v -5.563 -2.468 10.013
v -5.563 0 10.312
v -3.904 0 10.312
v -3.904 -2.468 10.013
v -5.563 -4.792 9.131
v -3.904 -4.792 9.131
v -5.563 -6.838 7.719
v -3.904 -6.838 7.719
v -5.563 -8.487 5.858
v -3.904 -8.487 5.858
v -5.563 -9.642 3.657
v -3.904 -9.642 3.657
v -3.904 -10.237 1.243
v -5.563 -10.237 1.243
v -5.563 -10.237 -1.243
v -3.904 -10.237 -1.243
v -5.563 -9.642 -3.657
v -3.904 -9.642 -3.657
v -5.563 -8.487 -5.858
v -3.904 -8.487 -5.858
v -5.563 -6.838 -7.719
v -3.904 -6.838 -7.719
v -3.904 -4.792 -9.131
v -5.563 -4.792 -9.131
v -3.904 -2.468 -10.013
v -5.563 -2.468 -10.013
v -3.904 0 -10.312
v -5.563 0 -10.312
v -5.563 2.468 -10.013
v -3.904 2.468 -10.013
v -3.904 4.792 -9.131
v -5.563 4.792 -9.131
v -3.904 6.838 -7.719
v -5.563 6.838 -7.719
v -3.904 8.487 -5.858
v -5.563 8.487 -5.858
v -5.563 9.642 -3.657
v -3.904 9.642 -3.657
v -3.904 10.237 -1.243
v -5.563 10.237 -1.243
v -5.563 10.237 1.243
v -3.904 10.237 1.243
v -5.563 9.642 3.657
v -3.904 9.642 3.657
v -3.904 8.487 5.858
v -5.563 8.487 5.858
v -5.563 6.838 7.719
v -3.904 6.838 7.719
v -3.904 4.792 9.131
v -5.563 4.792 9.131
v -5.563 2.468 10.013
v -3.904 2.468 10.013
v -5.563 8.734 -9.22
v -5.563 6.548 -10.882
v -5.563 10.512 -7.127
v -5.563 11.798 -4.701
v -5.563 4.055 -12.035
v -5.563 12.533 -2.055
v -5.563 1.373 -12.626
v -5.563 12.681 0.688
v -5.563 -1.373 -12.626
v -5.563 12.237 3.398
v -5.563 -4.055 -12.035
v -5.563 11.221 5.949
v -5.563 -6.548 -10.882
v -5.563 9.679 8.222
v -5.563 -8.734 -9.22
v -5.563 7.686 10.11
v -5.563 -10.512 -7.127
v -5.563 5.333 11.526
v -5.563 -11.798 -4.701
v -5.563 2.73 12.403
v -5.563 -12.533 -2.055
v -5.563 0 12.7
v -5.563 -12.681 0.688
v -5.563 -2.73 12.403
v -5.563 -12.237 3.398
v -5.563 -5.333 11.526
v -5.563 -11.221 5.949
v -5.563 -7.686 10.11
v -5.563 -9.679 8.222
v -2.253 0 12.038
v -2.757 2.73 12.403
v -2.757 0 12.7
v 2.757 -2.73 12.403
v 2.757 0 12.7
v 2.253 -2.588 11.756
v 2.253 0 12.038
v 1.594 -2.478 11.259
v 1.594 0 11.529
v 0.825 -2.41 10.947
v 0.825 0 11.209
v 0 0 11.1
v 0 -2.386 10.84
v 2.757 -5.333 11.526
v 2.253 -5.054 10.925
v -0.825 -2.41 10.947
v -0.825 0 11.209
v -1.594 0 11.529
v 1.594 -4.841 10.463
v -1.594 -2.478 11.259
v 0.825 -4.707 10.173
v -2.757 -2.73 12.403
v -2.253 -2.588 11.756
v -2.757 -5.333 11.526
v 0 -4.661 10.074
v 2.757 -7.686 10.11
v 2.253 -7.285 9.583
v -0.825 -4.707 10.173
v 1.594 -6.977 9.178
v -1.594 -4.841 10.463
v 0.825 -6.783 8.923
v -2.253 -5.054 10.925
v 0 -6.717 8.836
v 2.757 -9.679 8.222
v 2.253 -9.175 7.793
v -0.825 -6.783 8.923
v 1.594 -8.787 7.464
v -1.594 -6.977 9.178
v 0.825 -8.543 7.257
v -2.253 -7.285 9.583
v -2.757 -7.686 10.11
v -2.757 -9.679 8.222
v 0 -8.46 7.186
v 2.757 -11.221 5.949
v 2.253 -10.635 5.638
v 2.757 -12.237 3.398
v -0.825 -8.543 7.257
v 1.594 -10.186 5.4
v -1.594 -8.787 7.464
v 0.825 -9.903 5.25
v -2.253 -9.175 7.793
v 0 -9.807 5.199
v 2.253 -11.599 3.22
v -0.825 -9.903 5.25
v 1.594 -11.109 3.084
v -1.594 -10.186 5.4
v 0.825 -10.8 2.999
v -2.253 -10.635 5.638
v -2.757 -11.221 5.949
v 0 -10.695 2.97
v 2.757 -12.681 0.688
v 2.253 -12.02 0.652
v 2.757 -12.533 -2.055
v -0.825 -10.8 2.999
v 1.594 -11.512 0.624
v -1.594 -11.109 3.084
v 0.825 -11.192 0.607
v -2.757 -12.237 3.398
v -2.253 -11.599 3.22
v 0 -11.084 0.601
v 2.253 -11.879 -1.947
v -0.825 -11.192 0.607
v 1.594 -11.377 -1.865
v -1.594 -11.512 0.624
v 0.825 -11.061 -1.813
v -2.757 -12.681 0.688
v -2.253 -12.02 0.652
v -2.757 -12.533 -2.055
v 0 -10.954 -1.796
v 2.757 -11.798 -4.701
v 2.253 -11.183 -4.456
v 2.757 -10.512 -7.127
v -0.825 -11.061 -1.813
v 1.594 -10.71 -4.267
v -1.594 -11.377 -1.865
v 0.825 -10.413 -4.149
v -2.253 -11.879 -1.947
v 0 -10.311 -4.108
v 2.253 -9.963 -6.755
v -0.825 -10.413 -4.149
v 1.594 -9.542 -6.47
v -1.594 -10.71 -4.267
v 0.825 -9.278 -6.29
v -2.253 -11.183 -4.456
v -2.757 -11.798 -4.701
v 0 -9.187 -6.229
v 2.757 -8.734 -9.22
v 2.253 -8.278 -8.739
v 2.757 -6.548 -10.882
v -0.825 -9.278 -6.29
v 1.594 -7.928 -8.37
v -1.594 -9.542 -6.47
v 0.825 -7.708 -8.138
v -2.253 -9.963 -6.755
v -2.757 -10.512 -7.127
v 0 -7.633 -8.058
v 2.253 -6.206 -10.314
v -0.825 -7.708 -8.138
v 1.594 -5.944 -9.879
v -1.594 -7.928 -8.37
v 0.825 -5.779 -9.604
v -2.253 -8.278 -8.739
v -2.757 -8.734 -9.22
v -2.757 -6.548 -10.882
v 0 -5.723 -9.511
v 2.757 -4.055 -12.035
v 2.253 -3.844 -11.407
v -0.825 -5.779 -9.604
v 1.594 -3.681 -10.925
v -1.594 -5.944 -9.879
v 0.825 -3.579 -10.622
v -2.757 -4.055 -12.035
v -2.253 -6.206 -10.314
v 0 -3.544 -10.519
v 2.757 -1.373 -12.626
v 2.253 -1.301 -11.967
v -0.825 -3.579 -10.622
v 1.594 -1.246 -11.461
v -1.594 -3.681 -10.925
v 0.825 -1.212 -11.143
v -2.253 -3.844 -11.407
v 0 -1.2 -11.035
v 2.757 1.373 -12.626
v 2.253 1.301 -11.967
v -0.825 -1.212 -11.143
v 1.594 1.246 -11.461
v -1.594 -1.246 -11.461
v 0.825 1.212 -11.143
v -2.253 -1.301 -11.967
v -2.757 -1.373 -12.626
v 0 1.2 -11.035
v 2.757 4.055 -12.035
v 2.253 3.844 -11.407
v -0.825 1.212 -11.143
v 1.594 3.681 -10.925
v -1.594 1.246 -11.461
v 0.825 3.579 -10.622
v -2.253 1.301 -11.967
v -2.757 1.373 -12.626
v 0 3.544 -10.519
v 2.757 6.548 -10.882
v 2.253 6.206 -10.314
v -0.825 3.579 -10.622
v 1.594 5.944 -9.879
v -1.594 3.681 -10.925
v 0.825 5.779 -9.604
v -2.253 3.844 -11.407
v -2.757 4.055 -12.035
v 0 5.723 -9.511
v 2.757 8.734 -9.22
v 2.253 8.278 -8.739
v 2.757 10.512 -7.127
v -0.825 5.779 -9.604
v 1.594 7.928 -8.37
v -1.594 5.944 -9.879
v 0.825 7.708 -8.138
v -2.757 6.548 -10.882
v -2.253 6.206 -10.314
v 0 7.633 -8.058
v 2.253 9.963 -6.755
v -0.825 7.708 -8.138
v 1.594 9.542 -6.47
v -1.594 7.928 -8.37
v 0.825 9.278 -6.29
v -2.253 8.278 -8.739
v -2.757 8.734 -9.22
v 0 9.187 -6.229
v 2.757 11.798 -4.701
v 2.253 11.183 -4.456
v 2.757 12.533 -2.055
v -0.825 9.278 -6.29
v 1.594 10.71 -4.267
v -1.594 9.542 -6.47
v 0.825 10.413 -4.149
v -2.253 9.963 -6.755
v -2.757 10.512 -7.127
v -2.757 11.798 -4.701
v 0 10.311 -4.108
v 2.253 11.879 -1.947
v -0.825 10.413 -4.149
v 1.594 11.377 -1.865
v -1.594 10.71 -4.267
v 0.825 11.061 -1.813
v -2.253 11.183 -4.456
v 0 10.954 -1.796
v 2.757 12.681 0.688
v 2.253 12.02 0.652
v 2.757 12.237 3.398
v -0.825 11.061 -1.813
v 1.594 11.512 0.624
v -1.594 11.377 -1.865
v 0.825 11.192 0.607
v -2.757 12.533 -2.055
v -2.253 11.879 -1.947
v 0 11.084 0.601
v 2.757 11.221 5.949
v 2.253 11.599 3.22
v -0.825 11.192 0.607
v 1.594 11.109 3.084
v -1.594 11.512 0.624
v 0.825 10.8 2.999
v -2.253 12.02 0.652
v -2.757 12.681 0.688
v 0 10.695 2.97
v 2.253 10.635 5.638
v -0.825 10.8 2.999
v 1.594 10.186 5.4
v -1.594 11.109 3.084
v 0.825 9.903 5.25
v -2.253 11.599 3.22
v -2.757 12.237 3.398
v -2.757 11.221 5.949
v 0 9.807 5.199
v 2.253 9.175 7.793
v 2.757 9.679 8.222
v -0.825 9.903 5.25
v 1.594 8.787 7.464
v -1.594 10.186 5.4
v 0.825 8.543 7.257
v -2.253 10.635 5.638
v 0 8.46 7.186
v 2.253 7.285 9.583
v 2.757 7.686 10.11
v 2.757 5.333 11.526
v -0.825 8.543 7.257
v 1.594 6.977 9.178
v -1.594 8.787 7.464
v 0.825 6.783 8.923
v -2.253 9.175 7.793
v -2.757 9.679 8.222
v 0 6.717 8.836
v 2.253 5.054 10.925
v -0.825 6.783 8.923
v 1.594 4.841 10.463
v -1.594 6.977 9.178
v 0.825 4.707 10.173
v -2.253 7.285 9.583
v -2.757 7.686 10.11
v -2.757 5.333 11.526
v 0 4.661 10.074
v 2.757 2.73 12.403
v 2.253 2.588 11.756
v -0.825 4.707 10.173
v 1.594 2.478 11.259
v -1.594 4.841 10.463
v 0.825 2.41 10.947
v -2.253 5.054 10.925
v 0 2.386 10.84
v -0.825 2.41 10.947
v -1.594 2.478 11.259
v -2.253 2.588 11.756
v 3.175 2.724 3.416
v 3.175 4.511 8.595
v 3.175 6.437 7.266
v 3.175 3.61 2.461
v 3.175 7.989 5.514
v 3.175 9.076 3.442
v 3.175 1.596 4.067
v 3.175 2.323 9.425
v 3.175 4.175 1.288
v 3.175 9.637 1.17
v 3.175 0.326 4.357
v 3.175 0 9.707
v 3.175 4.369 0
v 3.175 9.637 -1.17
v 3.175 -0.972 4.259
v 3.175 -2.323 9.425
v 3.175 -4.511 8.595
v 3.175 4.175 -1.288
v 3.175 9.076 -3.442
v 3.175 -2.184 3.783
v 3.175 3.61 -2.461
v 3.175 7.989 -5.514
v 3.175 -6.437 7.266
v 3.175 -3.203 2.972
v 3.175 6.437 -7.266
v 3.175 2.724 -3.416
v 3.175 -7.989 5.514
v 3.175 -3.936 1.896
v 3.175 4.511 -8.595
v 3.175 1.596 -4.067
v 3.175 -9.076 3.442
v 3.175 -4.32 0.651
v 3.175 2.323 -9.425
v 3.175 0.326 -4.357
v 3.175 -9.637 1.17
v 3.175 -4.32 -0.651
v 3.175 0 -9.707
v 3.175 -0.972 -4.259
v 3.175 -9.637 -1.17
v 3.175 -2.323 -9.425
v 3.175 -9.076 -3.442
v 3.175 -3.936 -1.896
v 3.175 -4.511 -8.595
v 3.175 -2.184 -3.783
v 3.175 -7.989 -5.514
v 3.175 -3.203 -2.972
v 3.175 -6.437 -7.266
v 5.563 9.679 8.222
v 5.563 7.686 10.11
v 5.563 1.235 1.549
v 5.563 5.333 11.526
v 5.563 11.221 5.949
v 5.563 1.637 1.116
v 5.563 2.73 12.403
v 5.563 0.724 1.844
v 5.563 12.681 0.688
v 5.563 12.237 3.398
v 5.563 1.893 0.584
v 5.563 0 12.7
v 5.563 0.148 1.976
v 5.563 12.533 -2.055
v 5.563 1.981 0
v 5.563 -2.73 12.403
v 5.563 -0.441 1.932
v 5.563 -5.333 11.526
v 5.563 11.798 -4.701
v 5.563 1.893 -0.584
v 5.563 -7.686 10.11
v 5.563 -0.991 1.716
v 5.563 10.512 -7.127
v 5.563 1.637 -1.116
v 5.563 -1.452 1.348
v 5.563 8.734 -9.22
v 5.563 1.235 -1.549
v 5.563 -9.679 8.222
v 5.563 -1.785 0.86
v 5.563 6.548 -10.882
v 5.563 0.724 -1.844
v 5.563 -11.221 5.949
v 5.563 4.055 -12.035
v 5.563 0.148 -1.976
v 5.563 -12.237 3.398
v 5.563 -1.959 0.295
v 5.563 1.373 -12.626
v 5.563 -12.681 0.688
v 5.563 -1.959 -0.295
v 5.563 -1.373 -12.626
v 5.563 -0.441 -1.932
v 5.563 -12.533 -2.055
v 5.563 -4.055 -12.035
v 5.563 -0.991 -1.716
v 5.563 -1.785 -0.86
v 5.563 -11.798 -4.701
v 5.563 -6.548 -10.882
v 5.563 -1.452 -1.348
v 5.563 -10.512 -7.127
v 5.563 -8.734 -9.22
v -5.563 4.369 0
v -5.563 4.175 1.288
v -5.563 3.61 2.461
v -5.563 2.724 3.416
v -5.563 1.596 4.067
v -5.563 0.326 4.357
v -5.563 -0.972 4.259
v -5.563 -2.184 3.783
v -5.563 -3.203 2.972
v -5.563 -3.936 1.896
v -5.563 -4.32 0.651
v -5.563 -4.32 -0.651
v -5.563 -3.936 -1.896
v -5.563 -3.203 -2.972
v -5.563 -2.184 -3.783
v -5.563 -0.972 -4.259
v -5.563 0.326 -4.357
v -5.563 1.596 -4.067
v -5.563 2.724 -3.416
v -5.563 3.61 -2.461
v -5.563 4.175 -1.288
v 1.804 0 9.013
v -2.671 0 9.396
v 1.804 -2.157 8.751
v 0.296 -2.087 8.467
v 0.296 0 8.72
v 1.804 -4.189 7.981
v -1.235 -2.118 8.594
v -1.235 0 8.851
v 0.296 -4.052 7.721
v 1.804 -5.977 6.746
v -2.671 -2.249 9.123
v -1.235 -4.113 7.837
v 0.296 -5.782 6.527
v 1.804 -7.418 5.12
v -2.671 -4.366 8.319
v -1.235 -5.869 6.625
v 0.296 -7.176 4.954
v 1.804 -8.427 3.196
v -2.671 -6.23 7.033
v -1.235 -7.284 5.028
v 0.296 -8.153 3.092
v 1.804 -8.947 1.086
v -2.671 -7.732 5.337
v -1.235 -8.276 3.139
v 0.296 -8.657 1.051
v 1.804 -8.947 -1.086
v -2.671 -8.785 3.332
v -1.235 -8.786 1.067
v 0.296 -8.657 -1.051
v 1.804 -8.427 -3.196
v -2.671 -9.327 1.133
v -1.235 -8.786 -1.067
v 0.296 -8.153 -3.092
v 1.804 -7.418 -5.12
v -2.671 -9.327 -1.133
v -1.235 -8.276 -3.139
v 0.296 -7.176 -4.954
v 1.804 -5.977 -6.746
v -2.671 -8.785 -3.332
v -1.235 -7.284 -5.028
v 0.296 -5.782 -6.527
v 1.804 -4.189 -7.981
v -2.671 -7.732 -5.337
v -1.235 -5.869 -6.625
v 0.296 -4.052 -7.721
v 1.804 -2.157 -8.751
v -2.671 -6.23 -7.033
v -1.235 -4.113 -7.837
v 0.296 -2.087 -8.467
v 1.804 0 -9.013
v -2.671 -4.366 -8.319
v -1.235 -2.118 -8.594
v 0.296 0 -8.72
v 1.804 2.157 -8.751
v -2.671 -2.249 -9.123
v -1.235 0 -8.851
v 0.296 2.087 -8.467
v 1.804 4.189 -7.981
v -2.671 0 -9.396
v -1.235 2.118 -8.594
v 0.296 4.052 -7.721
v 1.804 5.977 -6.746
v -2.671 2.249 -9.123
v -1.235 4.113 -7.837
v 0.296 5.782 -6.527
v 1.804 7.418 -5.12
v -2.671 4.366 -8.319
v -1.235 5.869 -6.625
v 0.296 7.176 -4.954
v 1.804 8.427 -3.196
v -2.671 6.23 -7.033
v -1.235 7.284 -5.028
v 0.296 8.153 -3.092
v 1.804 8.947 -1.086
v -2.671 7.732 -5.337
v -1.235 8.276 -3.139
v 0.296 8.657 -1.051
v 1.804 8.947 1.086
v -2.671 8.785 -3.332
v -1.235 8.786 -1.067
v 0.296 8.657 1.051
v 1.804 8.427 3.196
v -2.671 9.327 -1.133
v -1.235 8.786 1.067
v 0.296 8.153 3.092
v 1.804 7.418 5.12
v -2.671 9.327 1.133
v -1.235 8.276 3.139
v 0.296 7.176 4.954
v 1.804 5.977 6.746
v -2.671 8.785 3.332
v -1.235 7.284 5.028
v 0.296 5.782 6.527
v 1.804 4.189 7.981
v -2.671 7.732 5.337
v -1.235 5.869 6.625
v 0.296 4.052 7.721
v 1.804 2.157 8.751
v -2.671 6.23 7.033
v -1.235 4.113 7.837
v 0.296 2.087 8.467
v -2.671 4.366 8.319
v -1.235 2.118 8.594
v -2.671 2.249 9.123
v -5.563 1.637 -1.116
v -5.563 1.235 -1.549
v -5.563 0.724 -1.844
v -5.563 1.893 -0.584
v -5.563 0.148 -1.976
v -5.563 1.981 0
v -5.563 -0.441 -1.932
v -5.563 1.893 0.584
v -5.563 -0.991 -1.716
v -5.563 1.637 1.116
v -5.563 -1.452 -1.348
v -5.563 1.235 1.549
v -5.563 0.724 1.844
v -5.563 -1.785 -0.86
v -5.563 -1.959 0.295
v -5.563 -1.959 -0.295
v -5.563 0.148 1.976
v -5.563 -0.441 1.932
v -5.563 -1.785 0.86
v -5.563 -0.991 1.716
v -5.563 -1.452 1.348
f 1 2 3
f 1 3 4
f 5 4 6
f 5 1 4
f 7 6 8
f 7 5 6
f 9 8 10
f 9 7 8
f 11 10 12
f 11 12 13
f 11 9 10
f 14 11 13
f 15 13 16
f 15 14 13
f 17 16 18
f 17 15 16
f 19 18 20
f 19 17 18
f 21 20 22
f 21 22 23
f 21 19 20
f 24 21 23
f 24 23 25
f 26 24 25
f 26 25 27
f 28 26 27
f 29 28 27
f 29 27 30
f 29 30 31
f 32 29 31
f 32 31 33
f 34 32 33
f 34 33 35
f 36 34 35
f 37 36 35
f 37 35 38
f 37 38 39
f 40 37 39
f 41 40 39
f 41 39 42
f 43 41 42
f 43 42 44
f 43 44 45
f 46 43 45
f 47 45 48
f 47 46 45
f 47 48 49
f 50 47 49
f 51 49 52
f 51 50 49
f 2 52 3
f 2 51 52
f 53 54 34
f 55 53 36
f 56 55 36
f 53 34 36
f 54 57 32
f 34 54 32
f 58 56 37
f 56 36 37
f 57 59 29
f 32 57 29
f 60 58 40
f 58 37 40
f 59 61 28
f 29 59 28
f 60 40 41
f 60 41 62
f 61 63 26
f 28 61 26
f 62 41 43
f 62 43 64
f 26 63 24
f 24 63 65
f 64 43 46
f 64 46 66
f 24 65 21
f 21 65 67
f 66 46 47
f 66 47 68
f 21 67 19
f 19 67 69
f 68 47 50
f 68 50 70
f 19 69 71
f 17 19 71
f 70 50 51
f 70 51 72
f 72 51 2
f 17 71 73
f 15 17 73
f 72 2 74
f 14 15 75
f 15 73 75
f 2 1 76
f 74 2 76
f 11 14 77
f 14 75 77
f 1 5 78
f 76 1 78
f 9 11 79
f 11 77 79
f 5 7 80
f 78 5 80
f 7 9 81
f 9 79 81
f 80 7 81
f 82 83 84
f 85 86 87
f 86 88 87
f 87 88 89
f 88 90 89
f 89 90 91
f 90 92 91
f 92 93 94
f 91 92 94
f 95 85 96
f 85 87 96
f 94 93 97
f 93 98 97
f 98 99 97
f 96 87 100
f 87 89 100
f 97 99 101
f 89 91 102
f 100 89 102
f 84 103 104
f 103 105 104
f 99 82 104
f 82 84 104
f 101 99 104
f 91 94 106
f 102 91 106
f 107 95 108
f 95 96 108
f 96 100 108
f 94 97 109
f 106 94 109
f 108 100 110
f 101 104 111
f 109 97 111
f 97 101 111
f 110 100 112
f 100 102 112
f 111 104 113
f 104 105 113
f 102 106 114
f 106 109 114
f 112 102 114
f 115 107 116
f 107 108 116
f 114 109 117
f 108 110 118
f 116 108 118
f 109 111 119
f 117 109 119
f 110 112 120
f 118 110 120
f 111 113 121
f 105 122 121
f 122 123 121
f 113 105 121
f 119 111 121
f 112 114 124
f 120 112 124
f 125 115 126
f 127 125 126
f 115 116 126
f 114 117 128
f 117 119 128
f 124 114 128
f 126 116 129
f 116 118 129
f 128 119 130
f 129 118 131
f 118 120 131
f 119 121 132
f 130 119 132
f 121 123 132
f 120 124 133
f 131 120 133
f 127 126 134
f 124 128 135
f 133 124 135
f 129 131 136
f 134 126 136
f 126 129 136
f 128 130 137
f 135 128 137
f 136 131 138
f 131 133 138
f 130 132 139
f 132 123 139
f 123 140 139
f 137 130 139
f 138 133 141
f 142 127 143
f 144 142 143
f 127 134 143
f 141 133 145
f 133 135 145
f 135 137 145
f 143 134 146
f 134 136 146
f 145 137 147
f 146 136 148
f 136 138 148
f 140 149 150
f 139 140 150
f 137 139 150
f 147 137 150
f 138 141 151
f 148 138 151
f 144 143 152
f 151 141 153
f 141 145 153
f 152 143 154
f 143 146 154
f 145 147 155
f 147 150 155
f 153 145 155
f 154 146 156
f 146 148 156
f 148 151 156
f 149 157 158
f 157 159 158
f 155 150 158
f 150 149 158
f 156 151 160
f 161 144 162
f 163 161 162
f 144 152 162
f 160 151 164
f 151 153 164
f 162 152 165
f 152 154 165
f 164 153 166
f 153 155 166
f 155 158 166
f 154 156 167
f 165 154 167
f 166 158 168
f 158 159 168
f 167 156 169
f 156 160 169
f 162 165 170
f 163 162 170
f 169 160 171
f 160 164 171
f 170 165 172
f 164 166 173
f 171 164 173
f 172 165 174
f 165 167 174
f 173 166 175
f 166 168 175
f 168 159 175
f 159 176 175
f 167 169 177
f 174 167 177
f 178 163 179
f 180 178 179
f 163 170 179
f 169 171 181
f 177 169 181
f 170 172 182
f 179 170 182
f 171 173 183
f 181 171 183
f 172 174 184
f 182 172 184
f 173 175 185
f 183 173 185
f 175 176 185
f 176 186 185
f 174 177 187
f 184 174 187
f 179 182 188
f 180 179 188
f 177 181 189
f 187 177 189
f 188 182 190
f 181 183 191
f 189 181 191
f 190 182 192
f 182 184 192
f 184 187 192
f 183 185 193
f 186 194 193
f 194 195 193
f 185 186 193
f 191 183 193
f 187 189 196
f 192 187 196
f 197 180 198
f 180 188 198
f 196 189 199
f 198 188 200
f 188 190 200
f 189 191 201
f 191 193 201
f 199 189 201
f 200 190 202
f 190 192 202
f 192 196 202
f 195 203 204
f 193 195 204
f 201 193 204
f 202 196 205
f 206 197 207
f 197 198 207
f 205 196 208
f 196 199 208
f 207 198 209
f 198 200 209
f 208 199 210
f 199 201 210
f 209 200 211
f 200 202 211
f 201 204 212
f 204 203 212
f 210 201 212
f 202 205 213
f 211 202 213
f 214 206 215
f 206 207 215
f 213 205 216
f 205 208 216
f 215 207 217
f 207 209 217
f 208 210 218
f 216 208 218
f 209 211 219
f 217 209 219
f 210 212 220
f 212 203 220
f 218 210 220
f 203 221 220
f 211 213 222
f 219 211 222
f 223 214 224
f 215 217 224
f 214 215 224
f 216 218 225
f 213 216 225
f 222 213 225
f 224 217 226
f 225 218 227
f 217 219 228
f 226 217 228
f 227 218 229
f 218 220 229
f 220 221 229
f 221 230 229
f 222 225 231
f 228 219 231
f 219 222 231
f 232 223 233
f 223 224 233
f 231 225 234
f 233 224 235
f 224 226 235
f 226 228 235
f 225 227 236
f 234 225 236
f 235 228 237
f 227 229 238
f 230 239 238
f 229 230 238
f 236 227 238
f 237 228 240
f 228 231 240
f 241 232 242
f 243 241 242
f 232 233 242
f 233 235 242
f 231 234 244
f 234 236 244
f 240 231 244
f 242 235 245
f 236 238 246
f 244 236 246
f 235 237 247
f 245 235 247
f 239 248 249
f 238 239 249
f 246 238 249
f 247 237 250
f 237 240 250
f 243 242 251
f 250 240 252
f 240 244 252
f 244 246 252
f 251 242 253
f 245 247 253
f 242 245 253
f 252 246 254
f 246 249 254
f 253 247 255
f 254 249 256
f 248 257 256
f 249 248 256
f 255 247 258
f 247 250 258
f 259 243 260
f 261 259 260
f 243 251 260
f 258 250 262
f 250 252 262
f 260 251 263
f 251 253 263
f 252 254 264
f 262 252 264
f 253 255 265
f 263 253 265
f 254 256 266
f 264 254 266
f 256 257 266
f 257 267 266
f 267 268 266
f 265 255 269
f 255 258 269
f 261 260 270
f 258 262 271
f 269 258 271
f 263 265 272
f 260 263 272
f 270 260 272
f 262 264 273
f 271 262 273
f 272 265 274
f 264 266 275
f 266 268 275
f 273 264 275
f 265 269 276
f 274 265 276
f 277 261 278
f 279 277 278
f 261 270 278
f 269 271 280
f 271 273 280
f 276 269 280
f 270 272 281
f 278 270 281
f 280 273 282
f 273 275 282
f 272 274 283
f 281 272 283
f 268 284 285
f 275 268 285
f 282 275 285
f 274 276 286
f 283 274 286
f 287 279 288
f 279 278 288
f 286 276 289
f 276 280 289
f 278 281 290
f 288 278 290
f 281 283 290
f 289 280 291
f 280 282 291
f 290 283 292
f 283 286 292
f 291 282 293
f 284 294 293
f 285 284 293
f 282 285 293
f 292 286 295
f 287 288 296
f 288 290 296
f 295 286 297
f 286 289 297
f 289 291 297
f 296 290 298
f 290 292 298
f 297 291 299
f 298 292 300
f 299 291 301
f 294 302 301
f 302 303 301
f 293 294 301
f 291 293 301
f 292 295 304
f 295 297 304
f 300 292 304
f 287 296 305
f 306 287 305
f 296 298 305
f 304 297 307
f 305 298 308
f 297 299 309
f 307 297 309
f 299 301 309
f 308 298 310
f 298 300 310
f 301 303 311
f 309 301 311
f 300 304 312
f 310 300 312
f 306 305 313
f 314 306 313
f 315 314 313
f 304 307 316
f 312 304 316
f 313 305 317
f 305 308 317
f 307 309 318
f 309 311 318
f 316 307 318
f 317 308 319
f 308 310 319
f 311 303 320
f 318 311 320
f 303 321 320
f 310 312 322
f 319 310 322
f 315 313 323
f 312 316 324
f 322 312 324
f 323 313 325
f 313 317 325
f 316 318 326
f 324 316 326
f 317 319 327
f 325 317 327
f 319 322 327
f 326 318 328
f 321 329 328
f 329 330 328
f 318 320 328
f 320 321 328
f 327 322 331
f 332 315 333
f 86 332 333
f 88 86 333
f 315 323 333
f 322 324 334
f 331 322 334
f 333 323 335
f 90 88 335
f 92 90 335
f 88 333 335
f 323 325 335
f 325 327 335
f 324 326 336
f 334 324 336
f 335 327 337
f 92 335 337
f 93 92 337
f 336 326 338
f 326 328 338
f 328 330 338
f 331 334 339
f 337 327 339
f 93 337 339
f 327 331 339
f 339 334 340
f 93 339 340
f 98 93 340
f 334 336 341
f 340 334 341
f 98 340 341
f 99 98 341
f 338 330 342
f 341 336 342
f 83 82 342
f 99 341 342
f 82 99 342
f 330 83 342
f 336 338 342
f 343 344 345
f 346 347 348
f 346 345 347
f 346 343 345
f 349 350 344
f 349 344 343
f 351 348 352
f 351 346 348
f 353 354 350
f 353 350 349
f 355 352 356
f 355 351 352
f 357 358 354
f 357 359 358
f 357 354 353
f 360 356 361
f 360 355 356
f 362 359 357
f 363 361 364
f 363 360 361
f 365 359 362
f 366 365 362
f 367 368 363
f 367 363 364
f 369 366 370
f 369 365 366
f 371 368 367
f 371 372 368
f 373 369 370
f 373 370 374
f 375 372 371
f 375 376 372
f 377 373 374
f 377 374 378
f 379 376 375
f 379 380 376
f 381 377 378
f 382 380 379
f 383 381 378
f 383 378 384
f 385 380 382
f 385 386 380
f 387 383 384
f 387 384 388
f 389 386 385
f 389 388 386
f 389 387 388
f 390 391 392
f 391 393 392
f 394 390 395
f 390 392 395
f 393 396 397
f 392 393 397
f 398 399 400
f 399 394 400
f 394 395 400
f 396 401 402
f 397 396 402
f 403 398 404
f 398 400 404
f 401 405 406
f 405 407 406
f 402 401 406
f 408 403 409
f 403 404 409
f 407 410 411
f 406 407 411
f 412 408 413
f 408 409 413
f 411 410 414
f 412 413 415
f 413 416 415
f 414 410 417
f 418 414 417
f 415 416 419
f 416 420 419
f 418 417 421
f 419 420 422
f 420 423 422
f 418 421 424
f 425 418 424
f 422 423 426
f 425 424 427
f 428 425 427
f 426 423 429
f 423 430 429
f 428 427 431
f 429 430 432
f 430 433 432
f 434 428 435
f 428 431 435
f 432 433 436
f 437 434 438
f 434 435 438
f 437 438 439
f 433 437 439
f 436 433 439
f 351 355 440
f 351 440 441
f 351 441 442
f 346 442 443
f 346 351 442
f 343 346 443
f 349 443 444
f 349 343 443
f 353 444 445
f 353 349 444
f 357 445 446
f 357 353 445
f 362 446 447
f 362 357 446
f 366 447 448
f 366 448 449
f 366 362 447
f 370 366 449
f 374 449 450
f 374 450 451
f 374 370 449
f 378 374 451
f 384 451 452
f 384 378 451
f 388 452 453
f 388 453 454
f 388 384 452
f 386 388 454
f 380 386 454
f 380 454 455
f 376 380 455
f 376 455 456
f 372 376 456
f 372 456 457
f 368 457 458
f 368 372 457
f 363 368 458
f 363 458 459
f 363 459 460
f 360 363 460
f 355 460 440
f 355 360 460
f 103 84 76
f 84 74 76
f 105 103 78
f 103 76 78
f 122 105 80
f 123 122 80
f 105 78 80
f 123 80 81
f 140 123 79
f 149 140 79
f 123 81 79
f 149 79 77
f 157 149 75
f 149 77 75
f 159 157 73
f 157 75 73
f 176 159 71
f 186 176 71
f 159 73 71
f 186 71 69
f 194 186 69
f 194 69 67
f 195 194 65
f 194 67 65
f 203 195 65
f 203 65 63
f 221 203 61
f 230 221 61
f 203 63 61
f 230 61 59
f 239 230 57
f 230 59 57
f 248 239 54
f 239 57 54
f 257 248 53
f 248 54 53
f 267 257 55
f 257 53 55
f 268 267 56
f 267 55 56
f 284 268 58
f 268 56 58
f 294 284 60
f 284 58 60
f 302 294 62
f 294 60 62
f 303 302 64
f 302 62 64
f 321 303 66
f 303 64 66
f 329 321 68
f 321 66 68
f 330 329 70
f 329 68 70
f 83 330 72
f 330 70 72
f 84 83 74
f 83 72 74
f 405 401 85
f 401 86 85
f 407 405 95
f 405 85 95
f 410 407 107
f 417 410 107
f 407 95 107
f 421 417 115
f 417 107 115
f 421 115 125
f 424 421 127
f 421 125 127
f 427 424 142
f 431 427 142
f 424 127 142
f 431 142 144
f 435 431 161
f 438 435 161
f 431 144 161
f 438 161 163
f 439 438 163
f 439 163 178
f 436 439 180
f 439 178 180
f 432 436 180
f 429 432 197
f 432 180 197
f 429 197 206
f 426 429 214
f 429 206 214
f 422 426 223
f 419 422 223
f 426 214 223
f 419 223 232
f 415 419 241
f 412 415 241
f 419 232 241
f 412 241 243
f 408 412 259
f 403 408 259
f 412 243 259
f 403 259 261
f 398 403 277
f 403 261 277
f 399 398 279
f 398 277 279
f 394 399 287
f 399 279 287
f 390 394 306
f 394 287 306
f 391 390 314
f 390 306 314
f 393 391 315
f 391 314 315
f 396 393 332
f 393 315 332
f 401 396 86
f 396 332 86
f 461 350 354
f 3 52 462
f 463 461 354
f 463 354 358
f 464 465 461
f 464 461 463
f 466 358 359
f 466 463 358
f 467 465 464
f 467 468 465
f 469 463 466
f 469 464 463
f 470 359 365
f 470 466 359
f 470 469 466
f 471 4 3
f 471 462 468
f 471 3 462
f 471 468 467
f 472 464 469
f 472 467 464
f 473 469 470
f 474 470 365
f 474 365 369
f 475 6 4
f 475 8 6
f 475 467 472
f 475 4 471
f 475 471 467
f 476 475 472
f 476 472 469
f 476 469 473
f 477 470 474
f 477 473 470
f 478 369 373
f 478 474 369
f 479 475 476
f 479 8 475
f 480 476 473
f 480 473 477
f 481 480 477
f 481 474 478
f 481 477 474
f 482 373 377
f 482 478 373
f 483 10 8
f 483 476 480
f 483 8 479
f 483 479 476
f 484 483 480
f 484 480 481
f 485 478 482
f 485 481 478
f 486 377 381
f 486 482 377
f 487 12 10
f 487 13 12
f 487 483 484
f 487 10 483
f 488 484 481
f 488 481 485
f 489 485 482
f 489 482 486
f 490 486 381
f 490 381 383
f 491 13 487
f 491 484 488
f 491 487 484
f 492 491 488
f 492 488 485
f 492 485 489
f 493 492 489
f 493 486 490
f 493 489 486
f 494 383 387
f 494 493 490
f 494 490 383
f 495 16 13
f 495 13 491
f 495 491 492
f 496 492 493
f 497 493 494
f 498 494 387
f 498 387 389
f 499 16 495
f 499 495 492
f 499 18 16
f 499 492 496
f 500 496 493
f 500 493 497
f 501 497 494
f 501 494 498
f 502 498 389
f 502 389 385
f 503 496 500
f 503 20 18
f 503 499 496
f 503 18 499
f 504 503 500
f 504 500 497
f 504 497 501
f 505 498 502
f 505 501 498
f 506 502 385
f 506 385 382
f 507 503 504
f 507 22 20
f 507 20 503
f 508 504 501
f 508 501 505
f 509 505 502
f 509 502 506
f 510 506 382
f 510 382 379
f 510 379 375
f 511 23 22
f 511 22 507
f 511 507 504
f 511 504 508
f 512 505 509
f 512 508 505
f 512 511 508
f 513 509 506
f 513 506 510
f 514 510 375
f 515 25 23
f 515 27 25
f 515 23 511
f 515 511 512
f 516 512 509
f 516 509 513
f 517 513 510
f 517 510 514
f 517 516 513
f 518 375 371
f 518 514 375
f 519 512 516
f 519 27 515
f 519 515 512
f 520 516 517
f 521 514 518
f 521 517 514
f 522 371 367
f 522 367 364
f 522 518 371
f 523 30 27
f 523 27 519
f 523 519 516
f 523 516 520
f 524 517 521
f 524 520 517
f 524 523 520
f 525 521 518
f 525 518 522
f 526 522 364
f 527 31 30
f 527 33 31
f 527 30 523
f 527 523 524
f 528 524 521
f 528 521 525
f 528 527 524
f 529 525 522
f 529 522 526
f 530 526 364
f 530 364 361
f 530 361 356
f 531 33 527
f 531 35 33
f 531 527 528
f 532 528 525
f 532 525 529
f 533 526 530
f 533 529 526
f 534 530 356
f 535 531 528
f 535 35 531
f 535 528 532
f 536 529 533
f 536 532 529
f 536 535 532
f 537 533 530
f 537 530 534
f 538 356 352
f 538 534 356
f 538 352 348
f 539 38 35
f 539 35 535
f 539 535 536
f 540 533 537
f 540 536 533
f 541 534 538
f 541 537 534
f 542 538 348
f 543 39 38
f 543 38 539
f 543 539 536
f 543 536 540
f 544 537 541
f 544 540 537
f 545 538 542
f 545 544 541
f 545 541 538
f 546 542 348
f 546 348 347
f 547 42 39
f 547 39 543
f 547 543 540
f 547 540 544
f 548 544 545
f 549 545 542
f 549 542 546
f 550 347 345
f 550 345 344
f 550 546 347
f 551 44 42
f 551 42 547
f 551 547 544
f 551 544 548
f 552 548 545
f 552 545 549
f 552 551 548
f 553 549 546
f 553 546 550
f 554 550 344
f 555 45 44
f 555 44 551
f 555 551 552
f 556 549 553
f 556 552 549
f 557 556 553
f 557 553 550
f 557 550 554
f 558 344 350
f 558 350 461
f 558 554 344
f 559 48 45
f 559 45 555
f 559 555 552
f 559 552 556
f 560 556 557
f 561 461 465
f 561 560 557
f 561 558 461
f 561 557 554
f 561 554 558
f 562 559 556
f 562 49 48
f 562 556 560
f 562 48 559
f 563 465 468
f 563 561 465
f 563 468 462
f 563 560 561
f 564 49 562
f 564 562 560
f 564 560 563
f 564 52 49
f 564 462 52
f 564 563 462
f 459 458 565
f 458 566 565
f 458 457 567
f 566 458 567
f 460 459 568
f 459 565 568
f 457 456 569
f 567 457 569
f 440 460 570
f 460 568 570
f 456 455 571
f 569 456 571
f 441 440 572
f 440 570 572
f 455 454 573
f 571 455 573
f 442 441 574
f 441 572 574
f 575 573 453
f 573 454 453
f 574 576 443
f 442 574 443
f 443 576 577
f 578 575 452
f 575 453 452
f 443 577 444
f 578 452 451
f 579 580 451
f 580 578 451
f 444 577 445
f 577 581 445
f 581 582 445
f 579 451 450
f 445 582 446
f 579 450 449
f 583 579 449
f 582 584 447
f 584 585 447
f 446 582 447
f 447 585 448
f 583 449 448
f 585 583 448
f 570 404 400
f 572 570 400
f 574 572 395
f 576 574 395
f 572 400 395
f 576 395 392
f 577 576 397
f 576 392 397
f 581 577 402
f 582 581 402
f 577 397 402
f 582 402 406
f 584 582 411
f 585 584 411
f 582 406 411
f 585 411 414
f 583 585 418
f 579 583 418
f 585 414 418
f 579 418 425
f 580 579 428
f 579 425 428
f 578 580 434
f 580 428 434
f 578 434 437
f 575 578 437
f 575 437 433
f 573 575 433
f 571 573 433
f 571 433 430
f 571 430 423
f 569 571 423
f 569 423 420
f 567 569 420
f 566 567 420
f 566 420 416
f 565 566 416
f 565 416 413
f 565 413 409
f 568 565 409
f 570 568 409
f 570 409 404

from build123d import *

# Parameters (mm, degrees)
F2_R     = 1.9812
F3_DEPTH = 11.1262
F4_T     = -2.3876


with BuildPart() as f1:
    # F0 (on Front) → F1 (revolve)
    with BuildSketch(Plane.XZ):
        with BuildLine():
            Line((-2.756924, 12.7), (-5.5626, 12.7))
            Line((-5.5626, 12.7), (-5.5626, 0))
            Line((-5.5626, 0), (5.5626, 0))
            Line((5.5626, 0), (5.5626, 12.7))
            Line((5.5626, 12.7), (2.756924, 12.7))
            ThreePointArc((2.756924, 12.7), (0, 11.0998), (-2.756924, 12.7))
        make_face()
    revolve(axis=Axis((0, 0, 0), (1, 0, 0)))

    # F2 (on face) → F3 (cut, through all)
    with BuildSketch(Plane.YZ.offset(5.5626)):
        Circle(F2_R)
    extrude(amount=-F3_DEPTH, mode=Mode.SUBTRACT)

    # F4
    f4_openings = [f1.faces().sort_by_distance(p)[0] for p in [
        (-5.5626, 0, -12.34079),
    ]]
    offset(amount=F4_T, openings=f4_openings)


solid = f1.part
